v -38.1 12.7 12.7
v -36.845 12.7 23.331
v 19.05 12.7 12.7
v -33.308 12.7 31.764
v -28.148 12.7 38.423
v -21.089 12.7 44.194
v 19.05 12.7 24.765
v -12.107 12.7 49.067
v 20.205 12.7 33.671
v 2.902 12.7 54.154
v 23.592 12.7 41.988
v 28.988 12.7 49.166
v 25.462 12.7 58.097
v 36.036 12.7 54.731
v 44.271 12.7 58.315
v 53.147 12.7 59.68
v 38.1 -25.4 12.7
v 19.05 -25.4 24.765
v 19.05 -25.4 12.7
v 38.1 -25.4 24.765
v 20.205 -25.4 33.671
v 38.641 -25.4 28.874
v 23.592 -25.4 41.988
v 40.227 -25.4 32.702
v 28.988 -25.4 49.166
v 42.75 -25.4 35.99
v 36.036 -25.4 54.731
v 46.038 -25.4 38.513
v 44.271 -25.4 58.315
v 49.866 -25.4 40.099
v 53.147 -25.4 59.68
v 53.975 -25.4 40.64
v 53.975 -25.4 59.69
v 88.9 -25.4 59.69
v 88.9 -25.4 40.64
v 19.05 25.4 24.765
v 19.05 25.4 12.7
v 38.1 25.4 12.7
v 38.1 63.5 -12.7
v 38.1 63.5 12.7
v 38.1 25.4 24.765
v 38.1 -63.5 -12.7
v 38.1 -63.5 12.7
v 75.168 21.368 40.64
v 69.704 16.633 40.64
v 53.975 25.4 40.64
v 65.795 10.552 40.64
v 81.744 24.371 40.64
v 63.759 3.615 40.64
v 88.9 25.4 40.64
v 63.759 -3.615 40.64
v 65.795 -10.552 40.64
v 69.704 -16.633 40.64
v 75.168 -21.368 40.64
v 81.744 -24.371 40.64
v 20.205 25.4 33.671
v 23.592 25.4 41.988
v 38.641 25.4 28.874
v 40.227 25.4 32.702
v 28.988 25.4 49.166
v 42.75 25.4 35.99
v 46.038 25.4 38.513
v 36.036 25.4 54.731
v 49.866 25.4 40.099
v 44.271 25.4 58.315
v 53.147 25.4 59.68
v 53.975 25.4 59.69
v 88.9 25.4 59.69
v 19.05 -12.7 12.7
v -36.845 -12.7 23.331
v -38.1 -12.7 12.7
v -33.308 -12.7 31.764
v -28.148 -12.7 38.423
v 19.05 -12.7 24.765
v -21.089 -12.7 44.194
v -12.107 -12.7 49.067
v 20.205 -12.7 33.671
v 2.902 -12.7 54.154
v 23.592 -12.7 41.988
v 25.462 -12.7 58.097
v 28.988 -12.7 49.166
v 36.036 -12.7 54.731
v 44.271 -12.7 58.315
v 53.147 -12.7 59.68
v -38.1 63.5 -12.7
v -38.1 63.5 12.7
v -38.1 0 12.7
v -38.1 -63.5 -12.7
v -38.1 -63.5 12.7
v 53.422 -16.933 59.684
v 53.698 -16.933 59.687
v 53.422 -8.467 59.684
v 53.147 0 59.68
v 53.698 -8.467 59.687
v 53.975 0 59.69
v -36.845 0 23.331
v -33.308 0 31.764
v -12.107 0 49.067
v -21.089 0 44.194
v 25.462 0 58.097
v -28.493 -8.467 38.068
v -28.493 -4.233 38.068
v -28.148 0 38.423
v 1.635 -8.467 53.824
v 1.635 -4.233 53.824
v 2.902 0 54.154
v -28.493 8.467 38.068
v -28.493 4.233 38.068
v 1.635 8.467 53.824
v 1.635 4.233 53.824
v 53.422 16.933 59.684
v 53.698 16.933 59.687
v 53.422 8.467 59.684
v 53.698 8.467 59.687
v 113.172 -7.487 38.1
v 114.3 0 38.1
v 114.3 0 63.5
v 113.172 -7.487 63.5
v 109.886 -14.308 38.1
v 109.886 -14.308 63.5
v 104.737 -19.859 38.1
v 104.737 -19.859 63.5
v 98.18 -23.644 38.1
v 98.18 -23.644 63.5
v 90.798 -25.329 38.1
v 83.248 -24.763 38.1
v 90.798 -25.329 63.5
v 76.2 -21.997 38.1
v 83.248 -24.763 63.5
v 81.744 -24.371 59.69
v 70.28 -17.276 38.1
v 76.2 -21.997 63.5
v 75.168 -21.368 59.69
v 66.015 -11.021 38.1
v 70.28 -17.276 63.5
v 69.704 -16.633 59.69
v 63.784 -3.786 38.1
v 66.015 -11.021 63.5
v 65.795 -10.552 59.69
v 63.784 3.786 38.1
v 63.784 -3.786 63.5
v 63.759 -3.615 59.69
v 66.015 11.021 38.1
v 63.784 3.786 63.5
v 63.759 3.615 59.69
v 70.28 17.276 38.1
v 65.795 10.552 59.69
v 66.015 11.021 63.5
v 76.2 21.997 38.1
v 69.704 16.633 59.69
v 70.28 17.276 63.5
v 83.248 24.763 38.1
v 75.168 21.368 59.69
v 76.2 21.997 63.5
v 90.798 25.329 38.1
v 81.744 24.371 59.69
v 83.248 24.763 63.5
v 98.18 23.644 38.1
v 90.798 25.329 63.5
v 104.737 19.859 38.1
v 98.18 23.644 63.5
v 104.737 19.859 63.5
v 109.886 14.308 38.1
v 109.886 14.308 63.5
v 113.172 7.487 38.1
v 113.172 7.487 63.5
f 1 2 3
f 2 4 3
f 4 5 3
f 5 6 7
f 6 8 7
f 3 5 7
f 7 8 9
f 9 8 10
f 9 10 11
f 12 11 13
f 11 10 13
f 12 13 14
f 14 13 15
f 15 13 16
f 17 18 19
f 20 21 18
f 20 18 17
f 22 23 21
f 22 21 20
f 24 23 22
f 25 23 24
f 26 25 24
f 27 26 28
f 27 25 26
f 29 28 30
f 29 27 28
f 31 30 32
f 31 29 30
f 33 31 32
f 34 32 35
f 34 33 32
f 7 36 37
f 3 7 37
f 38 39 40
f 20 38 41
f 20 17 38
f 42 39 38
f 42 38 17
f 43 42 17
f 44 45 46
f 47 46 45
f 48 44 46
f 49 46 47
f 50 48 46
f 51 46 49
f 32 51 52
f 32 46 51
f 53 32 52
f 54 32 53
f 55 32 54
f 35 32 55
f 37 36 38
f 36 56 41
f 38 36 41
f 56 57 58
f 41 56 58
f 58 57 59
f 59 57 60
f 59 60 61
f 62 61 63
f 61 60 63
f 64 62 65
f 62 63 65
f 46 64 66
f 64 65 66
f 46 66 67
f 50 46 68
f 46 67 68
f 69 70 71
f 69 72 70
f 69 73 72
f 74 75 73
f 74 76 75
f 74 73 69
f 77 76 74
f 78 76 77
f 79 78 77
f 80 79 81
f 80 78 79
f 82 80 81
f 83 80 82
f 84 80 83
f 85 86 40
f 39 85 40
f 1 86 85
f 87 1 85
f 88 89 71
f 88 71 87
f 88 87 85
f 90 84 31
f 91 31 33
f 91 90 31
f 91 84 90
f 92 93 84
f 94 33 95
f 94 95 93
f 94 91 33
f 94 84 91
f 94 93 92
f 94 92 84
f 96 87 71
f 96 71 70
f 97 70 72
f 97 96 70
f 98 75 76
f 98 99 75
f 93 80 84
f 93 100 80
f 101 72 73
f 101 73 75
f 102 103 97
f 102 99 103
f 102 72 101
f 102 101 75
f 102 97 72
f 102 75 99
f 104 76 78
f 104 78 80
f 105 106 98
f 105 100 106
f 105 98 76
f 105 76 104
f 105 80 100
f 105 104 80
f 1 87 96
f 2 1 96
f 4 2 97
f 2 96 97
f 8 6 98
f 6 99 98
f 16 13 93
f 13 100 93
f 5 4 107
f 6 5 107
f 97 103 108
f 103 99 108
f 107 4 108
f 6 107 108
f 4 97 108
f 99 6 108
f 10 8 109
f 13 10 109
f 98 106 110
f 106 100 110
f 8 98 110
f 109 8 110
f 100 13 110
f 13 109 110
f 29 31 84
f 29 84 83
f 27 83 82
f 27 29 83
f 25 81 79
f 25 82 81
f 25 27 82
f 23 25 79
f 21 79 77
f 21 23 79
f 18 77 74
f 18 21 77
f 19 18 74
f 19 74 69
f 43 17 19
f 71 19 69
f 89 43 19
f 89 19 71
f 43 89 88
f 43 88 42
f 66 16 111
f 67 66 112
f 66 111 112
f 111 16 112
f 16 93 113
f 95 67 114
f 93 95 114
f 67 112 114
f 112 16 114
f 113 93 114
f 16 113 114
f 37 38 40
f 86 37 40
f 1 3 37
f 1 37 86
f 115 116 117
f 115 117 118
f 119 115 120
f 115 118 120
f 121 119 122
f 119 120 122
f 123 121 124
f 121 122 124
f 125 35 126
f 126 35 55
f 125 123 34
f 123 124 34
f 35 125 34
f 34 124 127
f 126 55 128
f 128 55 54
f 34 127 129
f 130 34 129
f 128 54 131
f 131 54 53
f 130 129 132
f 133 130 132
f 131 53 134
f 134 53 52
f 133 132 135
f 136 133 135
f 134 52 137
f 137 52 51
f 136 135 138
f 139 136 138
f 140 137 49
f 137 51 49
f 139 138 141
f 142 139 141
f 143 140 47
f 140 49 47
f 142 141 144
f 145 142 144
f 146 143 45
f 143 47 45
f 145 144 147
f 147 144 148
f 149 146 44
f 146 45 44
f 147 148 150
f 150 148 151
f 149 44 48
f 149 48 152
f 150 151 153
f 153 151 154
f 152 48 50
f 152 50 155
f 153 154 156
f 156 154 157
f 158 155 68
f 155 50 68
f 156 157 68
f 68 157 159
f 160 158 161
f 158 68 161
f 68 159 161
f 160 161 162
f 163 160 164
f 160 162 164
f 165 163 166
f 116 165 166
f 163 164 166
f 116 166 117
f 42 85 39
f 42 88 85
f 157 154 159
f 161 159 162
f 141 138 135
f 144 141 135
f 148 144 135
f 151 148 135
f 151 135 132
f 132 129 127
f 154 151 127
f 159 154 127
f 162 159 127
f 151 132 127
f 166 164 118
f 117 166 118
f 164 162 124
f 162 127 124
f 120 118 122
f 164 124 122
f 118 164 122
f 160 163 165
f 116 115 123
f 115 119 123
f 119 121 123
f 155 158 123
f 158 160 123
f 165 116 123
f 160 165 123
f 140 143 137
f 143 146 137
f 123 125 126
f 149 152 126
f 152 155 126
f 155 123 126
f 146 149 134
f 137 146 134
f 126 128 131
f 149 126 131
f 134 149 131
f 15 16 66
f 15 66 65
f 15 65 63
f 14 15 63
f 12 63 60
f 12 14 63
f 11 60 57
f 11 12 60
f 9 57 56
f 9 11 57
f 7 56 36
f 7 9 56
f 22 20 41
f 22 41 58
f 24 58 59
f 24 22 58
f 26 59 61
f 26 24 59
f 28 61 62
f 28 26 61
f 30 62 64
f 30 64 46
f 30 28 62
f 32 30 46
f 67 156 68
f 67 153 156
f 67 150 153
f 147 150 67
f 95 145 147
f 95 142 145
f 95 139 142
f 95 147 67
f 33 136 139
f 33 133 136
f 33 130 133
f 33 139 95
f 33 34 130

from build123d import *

# Parameters (mm, degrees)
F1_DEPTH = 63.5
F2_DEPTH = 12.7
F0_W     = 25.4
F0_H     = 19.05
F3_DEPTH = 25.4


with BuildPart() as f1:
    # F0 (on Front) → F1 (new body, symmetric)
    with BuildSketch(Plane.XZ):
        Polygon((38.1, -12.7), (38.1, 12.7), (19.05, 12.7), (-38.1, 12.7), (-38.1, -12.7), align=None)
    extrude(amount=F1_DEPTH, both=True)

    # F0 (on Front) → F2 (join, symmetric)
    with BuildSketch(Plane.XZ):
        with BuildLine():
            Line((-38.1, 12.7), (19.05, 12.7))
            Line((19.05, 12.7), (19.05, 24.765))
            ThreePointArc((19.05, 24.765), (28.9881633288, 49.1660987082), (53.1466996803, 59.6801764077))
            add(Edge.make_bspline(
                [(-38.1, 12.7), (-38.4659506113, 42.7773494119), (-9.3436090352, 58.8699288364), (53.1466996803, 59.6801764077)],
                knots=[0, 0, 0, 0, 102.9188043099, 102.9188043099, 102.9188043099, 102.9188043099], degree=3))
        make_face()
    extrude(amount=F2_DEPTH, both=True)

    # F0 (on Front) → F3 (join, symmetric)
    with BuildSketch(Plane.XZ):
        with BuildLine():
            Line((19.05, 12.7), (38.1, 12.7))
            Line((38.1, 12.7), (38.1, 24.765))
            ThreePointArc((38.1, 24.765), (42.7496798487, 35.9903201513), (53.975, 40.64))
            Line((53.975, 40.64), (63.5, 40.64))
            Line((63.5, 40.64), (63.5, 59.69))
            Line((63.5, 59.69), (53.975, 59.69))
            add(Edge.make_bspline(
                [(53.1466996803, 59.6801764077), (53.4221513474, 59.6837479062), (53.6982513432, 59.687022474), (53.975, 59.69)],
                knots=[102.9188043099, 102.9188043099, 102.9188043099, 102.9188043099, 103.3724611538, 103.3724611538, 103.3724611538, 103.3724611538], degree=3))
            ThreePointArc((53.1466996803, 59.6801764077), (28.9881633288, 49.1660987082), (19.05, 24.765))
            Line((19.05, 24.765), (19.05, 12.7))
        make_face()
        with Locations((76.2, 50.165)):
            Rectangle(F0_W, F0_H)
    extrude(amount=F3_DEPTH, both=True)

    # F0 (on Front) → F4 (revolve)
    with BuildSketch(Plane.XZ):
        Polygon((88.9, 59.69), (88.9, 40.64), (88.9, 38.1), (114.3, 38.1), (114.3, 63.5), (88.9, 63.5), align=None)
    revolve(axis=Axis((88.9, 0, 50.8), (0, 0, -1)))


solid = f1.part
